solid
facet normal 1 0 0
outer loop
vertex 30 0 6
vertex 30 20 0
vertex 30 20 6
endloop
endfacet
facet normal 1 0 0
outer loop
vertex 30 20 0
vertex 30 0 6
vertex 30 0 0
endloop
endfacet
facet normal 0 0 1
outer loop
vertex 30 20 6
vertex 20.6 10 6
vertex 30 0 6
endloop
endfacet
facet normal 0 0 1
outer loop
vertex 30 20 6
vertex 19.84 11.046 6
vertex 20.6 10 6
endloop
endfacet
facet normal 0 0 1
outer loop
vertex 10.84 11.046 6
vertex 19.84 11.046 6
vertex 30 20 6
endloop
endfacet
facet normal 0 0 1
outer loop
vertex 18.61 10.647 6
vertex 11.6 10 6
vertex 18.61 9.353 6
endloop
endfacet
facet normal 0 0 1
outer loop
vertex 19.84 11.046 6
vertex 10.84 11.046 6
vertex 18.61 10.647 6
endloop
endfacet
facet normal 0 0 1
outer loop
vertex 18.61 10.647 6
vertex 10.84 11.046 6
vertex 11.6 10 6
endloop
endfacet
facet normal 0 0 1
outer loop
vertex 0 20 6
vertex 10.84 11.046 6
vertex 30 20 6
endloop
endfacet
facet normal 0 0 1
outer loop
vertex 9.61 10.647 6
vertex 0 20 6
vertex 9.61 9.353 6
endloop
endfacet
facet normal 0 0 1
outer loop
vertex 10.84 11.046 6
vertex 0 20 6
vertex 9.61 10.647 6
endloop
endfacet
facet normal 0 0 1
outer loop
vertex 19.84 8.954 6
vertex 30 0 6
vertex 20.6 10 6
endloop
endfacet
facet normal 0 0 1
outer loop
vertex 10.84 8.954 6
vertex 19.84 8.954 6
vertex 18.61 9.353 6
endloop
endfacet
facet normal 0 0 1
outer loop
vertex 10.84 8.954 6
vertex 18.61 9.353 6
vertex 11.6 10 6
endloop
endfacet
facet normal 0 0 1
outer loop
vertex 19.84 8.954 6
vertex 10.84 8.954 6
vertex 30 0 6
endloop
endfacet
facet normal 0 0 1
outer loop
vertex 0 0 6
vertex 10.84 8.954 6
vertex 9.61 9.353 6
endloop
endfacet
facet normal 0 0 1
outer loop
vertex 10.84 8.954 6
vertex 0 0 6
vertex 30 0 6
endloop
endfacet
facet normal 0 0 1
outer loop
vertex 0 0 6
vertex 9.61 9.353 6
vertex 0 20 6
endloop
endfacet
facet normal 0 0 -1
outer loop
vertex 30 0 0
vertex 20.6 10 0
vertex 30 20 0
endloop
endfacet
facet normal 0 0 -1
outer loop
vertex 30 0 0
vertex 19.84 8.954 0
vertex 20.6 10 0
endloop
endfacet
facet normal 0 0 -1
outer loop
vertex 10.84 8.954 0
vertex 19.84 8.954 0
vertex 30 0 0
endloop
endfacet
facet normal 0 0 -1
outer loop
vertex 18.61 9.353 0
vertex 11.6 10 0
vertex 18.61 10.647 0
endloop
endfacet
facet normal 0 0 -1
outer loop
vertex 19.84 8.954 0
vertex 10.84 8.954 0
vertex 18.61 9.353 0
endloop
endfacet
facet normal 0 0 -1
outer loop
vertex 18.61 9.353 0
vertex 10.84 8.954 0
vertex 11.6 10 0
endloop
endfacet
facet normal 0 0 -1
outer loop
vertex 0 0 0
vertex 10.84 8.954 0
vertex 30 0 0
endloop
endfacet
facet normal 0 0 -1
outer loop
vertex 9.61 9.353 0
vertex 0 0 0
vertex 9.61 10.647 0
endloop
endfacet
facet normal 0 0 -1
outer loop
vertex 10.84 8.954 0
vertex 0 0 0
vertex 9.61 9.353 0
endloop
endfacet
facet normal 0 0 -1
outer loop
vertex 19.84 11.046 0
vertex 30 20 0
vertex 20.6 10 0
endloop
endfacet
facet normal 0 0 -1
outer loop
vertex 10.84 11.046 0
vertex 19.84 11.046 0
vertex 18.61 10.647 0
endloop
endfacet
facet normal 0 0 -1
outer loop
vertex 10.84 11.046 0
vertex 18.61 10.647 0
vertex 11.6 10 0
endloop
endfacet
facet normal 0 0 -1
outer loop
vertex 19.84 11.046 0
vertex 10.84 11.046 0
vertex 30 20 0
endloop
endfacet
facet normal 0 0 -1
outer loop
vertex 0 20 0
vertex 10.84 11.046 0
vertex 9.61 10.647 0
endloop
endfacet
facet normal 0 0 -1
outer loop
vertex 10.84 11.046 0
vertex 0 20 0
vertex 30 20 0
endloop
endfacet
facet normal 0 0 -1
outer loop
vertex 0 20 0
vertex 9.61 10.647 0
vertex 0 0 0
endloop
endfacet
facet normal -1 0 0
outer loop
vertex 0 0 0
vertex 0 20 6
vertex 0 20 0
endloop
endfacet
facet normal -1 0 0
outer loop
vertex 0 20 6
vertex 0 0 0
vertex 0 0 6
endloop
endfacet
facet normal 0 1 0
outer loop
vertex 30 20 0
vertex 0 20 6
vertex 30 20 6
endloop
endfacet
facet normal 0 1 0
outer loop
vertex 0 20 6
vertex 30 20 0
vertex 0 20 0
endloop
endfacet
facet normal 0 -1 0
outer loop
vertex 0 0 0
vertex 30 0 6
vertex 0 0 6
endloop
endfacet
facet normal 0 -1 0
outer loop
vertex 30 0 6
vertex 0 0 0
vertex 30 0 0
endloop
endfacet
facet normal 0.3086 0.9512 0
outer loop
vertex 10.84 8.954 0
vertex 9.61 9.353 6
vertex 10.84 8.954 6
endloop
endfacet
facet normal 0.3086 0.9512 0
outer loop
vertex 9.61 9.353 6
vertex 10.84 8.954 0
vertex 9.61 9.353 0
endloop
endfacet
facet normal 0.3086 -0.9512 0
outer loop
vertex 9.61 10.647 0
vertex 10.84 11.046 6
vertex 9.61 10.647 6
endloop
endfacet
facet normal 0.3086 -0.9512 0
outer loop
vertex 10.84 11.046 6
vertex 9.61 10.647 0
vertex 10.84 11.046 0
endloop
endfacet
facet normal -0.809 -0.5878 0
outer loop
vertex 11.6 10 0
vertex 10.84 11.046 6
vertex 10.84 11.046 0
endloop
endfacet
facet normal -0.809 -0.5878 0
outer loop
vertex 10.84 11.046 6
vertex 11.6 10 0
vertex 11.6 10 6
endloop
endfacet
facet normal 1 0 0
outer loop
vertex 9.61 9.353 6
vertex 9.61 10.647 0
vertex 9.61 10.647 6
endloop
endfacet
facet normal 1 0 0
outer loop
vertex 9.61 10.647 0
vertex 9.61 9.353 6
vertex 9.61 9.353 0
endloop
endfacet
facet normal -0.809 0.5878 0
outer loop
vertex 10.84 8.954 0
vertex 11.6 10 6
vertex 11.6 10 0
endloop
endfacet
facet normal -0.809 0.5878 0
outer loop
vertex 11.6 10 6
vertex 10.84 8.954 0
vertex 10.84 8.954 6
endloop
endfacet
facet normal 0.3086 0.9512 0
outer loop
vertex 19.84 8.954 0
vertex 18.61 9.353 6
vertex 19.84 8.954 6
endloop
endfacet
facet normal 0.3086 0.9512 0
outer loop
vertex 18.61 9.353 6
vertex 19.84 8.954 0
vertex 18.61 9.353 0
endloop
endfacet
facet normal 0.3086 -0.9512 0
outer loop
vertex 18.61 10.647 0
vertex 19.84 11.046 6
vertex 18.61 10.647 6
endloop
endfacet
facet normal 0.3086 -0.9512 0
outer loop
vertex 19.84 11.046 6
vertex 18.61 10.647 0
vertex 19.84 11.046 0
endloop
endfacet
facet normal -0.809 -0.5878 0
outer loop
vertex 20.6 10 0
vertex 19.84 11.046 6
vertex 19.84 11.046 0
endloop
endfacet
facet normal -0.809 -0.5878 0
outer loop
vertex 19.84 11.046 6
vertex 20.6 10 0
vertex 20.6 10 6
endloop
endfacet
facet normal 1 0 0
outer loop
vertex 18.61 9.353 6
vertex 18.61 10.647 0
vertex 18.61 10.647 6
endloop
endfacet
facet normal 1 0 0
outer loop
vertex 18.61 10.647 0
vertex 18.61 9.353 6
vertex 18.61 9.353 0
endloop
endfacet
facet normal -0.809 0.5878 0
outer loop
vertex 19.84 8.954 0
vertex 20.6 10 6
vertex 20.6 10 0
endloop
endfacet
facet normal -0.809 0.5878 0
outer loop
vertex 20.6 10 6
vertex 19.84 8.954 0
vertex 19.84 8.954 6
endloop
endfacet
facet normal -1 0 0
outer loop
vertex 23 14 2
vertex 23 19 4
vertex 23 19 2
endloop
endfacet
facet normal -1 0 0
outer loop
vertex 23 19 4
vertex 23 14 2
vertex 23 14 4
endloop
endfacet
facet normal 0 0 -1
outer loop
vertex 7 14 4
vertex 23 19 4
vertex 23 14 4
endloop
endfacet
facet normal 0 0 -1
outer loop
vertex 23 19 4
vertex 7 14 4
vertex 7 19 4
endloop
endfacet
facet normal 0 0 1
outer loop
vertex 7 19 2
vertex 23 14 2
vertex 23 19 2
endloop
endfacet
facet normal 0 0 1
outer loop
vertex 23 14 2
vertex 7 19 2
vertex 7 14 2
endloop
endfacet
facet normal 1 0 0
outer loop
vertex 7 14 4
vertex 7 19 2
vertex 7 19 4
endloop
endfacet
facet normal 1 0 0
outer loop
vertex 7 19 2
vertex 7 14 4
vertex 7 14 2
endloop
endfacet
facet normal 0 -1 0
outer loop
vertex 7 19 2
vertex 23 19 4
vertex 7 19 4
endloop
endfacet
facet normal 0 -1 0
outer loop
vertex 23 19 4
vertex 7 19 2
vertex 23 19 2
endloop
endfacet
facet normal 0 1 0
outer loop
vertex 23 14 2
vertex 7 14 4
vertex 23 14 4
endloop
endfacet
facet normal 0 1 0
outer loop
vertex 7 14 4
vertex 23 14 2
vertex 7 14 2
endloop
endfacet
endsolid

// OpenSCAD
module endstop_mount() {
  difference() {
    cube([30.0, 20.0, 6.0], center=false);
    translate([10.5, 10.0, -1]) cylinder(h=8.0, d=2.2, center=false);
    translate([19.5, 10.0, -1]) cylinder(h=8.0, d=2.2, center=false);
    translate([7.0, 14.0, 2.0]) cube([16, 5, 2], center=false);
  }
}
endstop_mount();
